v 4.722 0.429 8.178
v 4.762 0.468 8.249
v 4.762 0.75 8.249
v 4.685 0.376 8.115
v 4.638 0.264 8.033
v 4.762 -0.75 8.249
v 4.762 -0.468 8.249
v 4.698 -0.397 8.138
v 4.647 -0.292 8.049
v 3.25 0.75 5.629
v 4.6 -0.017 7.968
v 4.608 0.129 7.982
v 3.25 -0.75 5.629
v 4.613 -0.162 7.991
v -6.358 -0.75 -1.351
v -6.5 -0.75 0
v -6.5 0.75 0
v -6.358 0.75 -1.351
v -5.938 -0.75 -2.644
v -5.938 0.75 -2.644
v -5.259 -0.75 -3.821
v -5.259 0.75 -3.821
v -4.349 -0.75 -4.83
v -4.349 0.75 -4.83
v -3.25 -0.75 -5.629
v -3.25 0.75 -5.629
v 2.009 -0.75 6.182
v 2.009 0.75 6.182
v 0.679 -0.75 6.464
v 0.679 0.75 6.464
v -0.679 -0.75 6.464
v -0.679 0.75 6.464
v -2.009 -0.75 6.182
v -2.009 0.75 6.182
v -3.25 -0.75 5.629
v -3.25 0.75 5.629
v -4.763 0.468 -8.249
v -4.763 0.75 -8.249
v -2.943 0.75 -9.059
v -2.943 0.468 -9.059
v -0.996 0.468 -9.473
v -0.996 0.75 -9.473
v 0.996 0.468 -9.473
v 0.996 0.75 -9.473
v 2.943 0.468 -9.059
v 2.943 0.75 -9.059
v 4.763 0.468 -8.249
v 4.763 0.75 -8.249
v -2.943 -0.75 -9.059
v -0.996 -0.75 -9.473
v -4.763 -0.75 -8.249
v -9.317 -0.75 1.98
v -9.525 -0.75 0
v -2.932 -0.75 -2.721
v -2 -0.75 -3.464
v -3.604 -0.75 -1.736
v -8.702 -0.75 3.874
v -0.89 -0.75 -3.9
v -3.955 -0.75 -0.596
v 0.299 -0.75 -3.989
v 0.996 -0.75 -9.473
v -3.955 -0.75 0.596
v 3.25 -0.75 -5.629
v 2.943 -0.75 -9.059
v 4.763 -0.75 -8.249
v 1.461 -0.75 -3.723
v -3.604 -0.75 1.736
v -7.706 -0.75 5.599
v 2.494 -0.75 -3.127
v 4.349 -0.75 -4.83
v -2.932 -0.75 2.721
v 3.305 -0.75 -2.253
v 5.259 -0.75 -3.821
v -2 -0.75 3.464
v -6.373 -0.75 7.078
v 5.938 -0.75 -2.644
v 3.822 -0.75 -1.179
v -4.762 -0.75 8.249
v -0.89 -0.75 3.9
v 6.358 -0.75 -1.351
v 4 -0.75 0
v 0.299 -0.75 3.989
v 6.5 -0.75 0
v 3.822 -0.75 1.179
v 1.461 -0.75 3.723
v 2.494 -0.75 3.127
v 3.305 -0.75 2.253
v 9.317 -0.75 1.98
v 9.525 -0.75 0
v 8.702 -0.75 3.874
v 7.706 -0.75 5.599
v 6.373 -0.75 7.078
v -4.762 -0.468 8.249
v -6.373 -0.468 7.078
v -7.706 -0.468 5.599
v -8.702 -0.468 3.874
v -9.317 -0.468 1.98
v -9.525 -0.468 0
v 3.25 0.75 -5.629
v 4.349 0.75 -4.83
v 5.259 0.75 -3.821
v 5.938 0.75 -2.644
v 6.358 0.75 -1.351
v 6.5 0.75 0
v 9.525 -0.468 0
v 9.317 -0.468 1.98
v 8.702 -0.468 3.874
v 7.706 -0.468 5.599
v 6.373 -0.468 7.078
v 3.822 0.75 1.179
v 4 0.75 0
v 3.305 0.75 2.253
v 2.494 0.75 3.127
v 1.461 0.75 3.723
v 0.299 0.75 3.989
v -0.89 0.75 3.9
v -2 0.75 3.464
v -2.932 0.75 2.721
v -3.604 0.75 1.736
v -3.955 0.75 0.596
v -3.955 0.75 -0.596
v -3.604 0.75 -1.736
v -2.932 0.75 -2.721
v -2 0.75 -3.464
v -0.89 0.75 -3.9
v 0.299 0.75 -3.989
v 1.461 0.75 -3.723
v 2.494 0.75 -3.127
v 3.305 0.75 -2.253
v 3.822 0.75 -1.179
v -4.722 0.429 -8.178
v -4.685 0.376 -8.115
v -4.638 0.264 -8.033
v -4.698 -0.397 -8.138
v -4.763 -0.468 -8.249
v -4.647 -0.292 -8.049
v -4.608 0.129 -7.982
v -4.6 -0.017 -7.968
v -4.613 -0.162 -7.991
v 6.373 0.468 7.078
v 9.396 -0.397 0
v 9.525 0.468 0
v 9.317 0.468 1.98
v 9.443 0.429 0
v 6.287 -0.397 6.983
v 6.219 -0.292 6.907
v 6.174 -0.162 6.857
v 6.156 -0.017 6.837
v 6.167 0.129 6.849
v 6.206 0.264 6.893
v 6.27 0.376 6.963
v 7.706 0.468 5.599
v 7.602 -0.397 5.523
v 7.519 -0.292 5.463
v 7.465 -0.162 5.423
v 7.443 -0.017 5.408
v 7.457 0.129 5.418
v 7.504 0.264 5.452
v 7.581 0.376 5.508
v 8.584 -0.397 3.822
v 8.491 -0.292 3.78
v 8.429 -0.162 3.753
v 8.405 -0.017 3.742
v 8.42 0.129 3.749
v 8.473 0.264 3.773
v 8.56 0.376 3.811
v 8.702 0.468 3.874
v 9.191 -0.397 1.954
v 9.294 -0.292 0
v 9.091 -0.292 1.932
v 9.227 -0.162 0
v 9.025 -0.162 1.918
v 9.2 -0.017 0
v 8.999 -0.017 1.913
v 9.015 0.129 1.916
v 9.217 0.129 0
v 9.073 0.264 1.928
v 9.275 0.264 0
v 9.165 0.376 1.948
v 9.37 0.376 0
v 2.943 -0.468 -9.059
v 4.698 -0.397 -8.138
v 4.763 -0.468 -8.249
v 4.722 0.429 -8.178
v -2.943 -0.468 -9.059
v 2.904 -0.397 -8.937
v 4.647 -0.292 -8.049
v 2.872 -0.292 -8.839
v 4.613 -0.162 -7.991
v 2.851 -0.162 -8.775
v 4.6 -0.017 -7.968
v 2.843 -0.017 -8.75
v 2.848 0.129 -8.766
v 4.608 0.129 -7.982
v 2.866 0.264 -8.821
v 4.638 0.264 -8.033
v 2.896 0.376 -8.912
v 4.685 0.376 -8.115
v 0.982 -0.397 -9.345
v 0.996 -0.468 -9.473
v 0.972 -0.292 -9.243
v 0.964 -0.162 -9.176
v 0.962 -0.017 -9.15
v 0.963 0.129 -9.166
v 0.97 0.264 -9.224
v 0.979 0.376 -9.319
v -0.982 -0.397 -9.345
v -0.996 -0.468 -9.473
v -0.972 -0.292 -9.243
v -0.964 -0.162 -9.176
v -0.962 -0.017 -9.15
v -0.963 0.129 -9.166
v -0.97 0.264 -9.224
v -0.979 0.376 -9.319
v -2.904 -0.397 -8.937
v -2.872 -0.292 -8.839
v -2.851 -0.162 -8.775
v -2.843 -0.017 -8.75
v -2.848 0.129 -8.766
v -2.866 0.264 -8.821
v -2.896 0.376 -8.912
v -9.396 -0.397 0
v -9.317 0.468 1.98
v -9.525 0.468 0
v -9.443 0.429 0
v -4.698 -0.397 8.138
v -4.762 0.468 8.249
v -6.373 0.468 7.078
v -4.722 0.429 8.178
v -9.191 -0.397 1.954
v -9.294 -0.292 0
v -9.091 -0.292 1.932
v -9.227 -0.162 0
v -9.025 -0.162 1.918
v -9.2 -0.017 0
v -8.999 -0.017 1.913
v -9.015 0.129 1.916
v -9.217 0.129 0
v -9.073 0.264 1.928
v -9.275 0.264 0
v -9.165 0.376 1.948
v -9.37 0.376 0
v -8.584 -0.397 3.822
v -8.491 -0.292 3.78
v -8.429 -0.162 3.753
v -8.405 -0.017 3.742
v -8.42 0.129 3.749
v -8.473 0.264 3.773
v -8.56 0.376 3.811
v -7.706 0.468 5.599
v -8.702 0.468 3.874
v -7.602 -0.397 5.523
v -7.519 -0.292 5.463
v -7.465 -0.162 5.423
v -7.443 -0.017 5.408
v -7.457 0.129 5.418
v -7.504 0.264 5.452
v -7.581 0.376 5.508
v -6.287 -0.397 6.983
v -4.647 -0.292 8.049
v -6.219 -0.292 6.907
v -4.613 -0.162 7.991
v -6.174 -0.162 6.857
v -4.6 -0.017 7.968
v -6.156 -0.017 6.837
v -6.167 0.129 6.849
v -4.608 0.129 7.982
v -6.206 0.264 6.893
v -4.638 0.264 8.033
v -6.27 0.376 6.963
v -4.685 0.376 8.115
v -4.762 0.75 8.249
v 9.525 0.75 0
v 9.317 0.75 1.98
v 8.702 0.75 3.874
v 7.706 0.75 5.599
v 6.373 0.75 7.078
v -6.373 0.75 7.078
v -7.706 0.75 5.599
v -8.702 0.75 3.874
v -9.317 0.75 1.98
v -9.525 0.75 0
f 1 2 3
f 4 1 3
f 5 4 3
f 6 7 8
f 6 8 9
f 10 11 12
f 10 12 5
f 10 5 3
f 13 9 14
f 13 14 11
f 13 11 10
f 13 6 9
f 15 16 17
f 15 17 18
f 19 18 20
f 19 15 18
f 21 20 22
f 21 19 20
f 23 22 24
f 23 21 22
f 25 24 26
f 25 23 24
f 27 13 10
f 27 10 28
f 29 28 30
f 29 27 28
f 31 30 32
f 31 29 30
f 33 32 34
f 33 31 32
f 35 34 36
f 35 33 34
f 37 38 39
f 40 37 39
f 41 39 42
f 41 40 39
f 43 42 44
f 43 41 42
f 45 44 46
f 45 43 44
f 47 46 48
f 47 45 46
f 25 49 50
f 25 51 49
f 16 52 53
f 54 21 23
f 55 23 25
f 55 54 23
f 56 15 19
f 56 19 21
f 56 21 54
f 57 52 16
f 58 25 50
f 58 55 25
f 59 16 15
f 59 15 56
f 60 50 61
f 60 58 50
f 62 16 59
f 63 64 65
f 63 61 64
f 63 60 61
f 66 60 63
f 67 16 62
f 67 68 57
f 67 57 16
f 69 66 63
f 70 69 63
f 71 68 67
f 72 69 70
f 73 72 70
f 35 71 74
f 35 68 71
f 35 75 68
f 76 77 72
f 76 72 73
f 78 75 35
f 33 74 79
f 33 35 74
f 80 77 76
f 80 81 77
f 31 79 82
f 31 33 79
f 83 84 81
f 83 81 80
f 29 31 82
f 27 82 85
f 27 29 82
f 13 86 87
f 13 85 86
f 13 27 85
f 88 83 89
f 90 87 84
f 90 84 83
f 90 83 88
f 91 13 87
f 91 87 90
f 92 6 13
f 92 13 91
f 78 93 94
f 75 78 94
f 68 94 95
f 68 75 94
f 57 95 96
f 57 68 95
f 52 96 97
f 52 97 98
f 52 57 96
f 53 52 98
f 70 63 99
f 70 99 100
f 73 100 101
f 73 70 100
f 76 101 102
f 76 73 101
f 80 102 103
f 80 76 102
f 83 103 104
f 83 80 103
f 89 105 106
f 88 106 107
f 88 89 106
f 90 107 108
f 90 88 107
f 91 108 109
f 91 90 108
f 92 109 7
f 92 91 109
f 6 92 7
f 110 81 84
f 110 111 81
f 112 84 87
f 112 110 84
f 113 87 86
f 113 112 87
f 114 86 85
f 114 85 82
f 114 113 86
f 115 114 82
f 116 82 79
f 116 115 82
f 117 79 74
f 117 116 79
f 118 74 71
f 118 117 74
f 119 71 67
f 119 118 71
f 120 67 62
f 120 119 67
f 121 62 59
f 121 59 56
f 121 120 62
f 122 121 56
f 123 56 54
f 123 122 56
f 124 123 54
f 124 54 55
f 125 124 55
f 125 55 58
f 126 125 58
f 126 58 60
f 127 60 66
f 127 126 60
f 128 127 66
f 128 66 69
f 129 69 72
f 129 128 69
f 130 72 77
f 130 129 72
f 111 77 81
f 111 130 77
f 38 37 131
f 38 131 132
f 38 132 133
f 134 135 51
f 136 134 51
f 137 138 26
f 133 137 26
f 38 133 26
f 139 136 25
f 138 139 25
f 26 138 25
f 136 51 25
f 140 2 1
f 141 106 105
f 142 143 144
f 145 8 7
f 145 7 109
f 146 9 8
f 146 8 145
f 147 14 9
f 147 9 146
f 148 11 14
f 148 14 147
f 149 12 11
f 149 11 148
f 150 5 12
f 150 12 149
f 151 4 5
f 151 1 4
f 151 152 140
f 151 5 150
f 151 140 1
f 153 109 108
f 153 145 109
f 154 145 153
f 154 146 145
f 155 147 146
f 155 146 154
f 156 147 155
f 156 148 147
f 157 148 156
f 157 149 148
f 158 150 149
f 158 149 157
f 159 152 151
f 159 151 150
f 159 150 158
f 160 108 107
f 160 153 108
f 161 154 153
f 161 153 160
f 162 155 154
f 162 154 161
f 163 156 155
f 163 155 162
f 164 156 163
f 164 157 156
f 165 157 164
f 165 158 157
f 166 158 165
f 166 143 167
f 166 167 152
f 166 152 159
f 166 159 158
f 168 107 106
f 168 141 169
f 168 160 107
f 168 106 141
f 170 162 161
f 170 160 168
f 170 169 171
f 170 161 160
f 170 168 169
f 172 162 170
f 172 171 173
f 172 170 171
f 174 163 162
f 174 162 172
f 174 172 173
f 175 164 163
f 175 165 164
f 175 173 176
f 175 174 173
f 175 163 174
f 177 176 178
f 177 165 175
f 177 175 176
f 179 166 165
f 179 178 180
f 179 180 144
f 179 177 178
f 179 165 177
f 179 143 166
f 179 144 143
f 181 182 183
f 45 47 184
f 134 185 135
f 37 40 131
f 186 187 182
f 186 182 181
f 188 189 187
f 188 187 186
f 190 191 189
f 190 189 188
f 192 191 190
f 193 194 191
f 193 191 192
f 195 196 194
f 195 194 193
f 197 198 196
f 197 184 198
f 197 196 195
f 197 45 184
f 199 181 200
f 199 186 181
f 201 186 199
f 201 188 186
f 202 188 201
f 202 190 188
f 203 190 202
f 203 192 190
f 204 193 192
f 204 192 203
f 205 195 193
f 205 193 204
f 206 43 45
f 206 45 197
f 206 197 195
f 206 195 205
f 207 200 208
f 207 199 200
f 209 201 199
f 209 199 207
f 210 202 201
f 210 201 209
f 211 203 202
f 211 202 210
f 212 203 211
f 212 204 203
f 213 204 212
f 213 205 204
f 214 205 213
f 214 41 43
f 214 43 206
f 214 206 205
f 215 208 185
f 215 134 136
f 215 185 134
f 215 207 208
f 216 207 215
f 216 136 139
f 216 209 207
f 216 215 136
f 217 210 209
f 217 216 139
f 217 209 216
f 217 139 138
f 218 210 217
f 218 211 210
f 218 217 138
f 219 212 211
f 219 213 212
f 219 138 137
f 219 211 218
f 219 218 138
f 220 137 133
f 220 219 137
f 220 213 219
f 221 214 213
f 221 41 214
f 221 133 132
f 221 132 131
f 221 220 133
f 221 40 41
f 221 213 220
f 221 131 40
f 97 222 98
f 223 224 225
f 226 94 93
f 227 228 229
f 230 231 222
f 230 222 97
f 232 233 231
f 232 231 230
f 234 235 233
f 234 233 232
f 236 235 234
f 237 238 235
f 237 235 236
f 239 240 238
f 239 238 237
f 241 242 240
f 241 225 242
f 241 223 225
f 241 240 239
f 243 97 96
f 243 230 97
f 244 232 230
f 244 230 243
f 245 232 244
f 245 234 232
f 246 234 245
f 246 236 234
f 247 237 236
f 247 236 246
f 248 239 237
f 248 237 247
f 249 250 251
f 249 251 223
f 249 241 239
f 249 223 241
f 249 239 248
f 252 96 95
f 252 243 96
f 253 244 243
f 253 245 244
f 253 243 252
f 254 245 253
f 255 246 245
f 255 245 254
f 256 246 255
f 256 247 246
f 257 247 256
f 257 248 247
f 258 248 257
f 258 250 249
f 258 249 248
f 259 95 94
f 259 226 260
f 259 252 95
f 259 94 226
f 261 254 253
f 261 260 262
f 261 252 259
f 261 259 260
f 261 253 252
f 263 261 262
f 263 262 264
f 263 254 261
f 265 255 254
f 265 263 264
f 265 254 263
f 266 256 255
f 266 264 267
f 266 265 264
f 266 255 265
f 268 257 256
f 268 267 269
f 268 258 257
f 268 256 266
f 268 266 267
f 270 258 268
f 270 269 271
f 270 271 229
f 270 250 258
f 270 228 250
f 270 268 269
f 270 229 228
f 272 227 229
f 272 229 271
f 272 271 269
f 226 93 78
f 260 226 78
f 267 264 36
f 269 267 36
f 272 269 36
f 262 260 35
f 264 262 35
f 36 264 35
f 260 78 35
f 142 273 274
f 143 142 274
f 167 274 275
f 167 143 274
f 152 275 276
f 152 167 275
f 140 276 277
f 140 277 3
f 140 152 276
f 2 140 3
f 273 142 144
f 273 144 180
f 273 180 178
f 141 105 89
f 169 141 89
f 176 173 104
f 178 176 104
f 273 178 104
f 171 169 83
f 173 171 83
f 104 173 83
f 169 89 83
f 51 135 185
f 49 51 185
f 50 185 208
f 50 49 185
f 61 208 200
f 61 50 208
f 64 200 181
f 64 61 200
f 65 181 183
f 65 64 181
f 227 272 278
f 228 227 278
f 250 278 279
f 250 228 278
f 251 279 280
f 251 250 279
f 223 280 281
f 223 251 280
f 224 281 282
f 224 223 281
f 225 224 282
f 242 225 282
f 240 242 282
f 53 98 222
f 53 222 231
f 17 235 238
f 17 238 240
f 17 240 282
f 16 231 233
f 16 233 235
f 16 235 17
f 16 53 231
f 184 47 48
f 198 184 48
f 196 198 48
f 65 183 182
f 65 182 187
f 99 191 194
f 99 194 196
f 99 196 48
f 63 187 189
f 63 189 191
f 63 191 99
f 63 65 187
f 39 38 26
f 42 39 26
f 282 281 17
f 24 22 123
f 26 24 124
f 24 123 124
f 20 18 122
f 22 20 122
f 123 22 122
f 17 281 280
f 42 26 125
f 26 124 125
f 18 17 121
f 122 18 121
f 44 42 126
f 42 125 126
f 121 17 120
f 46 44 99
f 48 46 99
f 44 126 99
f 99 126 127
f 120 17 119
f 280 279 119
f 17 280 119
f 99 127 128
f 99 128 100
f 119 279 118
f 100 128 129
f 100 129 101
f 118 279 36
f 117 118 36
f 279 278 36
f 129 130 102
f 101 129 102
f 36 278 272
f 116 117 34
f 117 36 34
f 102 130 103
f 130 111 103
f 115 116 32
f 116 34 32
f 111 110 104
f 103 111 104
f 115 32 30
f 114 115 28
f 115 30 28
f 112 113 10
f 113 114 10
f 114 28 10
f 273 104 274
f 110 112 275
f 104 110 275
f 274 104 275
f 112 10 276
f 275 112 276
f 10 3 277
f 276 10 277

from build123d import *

# Parameters (mm, degrees)
SKETCH005_R          = 9.525
SKETCH005_R_2        = 4
PAD001_DEPTH         = 0.75
POCKET001_DEPTH      = 54.715989
POCKET001_DEPTH_BACK = 54.715989
POLARPATTERN_COUNT   = 3
SKETCH007_R          = 0.5


with BuildPart() as part:
    # Sketch005 → Pad001 (new body, symmetric)
    with BuildSketch(Plane.XZ):
        Circle(SKETCH005_R)
        Circle(SKETCH005_R_2, mode=Mode.SUBTRACT)
    extrude(amount=PAD001_DEPTH, both=True)

    # Sketch006 → Pocket001 (cut, two sides)
    with BuildSketch(Plane.XZ) as pocket001_sk:
        with BuildLine():
            ThreePointArc((3.25, 5.629165), (0, 6.5), (-3.25, 5.629165))
            Line((-4.7625, 8.248892), (-3.25, 5.629165))
            ThreePointArc((4.7625, 8.248892), (0, 9.525), (-4.7625, 8.248892))
            Line((4.7625, 8.248892), (3.25, 5.629165))
        make_face()
    pocket001 = extrude(amount=-POCKET001_DEPTH, mode=Mode.SUBTRACT) + extrude(pocket001_sk.sketch, amount=POCKET001_DEPTH_BACK, mode=Mode.SUBTRACT)

    # PolarPattern: Pocket001 ×3 about axis
    polarpattern_axis = Axis((0, 0, 0), (0, -1, 0))
    for i in range(1, POLARPATTERN_COUNT):
        add(pocket001.rotate(polarpattern_axis, i * 360 / POLARPATTERN_COUNT), mode=Mode.SUBTRACT)

    # Sketch007 → Groove001 (revolve, cut)
    with BuildSketch(Plane.YZ):
        with Locations((0, 9.7)):
            Circle(SKETCH007_R)
    revolve(axis=Axis((0, 0, 0), (0, 1, 0)), mode=Mode.SUBTRACT)


solid = part.part
